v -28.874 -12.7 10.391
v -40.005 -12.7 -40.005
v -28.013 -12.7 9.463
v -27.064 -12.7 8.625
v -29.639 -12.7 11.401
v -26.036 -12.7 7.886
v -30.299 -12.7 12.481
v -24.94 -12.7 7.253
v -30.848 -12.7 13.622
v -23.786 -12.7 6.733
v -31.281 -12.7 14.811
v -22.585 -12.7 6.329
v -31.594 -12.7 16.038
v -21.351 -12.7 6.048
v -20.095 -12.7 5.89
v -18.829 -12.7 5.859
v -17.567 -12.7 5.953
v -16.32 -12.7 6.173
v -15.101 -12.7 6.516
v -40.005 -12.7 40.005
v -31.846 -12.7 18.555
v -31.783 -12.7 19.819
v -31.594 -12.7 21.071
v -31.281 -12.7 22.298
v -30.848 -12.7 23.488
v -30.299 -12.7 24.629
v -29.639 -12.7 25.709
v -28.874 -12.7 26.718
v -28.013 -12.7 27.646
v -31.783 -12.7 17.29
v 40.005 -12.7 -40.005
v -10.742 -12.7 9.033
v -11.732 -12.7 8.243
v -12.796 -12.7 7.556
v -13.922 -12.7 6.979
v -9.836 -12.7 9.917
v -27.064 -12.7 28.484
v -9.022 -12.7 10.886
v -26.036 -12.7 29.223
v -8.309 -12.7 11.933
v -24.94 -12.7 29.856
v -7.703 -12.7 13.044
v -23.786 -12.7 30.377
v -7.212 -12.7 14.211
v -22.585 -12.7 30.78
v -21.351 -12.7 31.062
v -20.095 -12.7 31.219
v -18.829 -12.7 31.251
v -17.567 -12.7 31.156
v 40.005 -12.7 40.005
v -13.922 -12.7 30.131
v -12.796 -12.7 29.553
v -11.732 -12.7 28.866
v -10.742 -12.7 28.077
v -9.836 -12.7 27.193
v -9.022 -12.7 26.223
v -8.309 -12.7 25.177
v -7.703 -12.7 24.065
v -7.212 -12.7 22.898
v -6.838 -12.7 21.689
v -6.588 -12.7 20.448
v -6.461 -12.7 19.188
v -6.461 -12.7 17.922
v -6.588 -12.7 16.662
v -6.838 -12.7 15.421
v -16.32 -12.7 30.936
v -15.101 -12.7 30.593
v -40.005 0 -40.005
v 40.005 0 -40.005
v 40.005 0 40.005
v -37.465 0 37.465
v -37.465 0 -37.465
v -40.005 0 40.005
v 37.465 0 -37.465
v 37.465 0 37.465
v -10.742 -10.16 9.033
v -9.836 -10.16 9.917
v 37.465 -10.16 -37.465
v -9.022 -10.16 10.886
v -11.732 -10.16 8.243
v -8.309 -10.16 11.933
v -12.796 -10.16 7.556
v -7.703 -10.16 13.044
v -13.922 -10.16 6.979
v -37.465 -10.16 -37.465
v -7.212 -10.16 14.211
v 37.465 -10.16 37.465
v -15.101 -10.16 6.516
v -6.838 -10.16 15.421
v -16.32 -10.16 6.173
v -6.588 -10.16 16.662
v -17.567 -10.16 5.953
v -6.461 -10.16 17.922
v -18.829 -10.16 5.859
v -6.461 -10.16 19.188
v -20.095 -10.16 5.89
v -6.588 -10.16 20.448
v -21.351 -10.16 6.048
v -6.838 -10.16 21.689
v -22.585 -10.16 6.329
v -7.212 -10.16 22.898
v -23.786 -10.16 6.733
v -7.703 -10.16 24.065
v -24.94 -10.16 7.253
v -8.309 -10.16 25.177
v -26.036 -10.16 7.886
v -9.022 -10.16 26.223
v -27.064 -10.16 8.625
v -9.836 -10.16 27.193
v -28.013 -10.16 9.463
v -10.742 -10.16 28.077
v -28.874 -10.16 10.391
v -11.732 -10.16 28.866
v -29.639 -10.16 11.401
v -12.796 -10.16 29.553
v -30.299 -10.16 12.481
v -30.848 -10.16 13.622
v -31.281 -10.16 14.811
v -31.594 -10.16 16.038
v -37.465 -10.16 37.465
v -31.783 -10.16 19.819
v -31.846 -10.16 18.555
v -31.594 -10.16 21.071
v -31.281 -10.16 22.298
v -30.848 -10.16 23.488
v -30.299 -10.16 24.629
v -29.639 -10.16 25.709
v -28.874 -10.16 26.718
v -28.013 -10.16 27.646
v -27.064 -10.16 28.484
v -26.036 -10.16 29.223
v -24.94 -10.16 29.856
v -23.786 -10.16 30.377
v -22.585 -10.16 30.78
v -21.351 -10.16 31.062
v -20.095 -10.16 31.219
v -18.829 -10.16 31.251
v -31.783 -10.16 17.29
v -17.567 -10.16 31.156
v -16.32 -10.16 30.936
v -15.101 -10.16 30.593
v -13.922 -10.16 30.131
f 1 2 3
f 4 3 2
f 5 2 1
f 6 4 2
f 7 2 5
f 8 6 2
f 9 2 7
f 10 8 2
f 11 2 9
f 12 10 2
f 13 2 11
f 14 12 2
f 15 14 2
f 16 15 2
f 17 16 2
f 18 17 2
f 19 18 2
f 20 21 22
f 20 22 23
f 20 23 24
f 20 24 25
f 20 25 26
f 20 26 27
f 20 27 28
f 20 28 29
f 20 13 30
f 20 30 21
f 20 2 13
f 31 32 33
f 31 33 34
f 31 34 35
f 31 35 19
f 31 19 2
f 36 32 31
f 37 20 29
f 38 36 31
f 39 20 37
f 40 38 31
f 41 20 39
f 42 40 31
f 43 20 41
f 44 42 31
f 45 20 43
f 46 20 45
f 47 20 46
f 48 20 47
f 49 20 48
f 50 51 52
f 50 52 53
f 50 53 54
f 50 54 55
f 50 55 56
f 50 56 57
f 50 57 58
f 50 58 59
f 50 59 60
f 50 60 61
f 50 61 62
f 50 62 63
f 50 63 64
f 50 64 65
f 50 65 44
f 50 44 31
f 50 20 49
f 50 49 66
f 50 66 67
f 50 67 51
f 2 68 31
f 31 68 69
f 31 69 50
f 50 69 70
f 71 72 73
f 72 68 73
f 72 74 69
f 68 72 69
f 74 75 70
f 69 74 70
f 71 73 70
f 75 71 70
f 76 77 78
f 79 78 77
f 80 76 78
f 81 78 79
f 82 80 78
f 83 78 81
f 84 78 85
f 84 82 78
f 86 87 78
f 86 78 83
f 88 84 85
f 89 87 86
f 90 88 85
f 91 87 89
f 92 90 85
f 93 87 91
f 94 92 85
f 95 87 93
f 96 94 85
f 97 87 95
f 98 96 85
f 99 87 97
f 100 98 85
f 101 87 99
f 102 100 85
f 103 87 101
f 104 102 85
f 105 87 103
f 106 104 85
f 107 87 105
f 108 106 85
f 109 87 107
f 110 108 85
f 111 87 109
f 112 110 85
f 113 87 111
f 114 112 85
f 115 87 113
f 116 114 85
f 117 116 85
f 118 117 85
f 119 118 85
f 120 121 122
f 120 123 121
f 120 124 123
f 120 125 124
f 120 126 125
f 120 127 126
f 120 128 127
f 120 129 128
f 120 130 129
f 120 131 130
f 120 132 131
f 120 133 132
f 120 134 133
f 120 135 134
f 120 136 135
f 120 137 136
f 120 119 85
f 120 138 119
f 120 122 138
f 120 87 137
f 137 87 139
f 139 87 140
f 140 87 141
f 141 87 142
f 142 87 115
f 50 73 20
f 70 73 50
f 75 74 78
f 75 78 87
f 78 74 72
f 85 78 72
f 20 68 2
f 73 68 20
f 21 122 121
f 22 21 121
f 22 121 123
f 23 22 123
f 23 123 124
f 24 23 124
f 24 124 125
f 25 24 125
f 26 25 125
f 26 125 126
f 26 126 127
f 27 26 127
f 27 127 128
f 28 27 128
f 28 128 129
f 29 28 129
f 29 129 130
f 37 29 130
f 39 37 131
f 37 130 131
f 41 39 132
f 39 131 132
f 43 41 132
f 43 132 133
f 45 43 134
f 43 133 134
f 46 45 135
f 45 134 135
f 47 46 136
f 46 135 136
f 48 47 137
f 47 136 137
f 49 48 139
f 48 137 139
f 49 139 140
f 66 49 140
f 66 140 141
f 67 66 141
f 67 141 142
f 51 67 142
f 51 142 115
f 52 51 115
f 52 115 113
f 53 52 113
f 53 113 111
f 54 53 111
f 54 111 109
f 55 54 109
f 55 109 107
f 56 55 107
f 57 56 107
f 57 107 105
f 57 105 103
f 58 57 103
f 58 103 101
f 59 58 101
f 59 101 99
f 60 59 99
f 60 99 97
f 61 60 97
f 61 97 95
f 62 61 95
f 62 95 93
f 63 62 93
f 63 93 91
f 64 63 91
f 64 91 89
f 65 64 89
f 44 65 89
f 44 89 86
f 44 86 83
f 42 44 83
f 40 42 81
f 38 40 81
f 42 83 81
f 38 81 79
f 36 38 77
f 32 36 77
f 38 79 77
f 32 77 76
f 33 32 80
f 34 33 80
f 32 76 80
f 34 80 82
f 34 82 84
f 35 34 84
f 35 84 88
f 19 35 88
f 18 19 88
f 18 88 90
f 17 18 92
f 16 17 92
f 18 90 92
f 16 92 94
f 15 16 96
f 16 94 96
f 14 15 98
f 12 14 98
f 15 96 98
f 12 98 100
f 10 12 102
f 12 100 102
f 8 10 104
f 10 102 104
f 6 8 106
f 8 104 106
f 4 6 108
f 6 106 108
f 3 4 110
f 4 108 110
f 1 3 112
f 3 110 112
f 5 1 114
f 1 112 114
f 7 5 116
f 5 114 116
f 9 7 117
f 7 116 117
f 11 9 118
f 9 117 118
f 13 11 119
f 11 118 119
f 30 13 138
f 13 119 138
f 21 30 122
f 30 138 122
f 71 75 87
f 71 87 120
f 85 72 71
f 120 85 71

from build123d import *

# Parameters (mm, degrees)
F0_W     = 80.01
F0_H     = 80.01
F1_DEPTH = 12.7
F2_W     = 74.93
F2_H     = 74.93
F3_DEPTH = 10.16
F4_R     = 12.7
F5_DEPTH = 25.4


with BuildPart() as f1:
    # F0 (on Front) → F1 (new body)
    with BuildSketch(Plane.XZ):
        Rectangle(F0_W, F0_H)
    extrude(amount=F1_DEPTH)

    # F2 (on face) → F3 (cut)
    with BuildSketch(Plane(origin=(0, 0, 0), x_dir=(-1, 0, 0), z_dir=(0, 1, 0))):
        Rectangle(F2_W, F2_H)
    extrude(amount=-F3_DEPTH, mode=Mode.SUBTRACT)

    # F4 (on face) → F5 (cut)
    with BuildSketch(Plane(origin=(0, -10.16, 0), x_dir=(-1, 0, 0), z_dir=(0, 1, 0))):
        with Locations((19.145673, 18.554756)):
            Circle(F4_R)
    extrude(amount=-F5_DEPTH, mode=Mode.SUBTRACT)


solid = f1.part
